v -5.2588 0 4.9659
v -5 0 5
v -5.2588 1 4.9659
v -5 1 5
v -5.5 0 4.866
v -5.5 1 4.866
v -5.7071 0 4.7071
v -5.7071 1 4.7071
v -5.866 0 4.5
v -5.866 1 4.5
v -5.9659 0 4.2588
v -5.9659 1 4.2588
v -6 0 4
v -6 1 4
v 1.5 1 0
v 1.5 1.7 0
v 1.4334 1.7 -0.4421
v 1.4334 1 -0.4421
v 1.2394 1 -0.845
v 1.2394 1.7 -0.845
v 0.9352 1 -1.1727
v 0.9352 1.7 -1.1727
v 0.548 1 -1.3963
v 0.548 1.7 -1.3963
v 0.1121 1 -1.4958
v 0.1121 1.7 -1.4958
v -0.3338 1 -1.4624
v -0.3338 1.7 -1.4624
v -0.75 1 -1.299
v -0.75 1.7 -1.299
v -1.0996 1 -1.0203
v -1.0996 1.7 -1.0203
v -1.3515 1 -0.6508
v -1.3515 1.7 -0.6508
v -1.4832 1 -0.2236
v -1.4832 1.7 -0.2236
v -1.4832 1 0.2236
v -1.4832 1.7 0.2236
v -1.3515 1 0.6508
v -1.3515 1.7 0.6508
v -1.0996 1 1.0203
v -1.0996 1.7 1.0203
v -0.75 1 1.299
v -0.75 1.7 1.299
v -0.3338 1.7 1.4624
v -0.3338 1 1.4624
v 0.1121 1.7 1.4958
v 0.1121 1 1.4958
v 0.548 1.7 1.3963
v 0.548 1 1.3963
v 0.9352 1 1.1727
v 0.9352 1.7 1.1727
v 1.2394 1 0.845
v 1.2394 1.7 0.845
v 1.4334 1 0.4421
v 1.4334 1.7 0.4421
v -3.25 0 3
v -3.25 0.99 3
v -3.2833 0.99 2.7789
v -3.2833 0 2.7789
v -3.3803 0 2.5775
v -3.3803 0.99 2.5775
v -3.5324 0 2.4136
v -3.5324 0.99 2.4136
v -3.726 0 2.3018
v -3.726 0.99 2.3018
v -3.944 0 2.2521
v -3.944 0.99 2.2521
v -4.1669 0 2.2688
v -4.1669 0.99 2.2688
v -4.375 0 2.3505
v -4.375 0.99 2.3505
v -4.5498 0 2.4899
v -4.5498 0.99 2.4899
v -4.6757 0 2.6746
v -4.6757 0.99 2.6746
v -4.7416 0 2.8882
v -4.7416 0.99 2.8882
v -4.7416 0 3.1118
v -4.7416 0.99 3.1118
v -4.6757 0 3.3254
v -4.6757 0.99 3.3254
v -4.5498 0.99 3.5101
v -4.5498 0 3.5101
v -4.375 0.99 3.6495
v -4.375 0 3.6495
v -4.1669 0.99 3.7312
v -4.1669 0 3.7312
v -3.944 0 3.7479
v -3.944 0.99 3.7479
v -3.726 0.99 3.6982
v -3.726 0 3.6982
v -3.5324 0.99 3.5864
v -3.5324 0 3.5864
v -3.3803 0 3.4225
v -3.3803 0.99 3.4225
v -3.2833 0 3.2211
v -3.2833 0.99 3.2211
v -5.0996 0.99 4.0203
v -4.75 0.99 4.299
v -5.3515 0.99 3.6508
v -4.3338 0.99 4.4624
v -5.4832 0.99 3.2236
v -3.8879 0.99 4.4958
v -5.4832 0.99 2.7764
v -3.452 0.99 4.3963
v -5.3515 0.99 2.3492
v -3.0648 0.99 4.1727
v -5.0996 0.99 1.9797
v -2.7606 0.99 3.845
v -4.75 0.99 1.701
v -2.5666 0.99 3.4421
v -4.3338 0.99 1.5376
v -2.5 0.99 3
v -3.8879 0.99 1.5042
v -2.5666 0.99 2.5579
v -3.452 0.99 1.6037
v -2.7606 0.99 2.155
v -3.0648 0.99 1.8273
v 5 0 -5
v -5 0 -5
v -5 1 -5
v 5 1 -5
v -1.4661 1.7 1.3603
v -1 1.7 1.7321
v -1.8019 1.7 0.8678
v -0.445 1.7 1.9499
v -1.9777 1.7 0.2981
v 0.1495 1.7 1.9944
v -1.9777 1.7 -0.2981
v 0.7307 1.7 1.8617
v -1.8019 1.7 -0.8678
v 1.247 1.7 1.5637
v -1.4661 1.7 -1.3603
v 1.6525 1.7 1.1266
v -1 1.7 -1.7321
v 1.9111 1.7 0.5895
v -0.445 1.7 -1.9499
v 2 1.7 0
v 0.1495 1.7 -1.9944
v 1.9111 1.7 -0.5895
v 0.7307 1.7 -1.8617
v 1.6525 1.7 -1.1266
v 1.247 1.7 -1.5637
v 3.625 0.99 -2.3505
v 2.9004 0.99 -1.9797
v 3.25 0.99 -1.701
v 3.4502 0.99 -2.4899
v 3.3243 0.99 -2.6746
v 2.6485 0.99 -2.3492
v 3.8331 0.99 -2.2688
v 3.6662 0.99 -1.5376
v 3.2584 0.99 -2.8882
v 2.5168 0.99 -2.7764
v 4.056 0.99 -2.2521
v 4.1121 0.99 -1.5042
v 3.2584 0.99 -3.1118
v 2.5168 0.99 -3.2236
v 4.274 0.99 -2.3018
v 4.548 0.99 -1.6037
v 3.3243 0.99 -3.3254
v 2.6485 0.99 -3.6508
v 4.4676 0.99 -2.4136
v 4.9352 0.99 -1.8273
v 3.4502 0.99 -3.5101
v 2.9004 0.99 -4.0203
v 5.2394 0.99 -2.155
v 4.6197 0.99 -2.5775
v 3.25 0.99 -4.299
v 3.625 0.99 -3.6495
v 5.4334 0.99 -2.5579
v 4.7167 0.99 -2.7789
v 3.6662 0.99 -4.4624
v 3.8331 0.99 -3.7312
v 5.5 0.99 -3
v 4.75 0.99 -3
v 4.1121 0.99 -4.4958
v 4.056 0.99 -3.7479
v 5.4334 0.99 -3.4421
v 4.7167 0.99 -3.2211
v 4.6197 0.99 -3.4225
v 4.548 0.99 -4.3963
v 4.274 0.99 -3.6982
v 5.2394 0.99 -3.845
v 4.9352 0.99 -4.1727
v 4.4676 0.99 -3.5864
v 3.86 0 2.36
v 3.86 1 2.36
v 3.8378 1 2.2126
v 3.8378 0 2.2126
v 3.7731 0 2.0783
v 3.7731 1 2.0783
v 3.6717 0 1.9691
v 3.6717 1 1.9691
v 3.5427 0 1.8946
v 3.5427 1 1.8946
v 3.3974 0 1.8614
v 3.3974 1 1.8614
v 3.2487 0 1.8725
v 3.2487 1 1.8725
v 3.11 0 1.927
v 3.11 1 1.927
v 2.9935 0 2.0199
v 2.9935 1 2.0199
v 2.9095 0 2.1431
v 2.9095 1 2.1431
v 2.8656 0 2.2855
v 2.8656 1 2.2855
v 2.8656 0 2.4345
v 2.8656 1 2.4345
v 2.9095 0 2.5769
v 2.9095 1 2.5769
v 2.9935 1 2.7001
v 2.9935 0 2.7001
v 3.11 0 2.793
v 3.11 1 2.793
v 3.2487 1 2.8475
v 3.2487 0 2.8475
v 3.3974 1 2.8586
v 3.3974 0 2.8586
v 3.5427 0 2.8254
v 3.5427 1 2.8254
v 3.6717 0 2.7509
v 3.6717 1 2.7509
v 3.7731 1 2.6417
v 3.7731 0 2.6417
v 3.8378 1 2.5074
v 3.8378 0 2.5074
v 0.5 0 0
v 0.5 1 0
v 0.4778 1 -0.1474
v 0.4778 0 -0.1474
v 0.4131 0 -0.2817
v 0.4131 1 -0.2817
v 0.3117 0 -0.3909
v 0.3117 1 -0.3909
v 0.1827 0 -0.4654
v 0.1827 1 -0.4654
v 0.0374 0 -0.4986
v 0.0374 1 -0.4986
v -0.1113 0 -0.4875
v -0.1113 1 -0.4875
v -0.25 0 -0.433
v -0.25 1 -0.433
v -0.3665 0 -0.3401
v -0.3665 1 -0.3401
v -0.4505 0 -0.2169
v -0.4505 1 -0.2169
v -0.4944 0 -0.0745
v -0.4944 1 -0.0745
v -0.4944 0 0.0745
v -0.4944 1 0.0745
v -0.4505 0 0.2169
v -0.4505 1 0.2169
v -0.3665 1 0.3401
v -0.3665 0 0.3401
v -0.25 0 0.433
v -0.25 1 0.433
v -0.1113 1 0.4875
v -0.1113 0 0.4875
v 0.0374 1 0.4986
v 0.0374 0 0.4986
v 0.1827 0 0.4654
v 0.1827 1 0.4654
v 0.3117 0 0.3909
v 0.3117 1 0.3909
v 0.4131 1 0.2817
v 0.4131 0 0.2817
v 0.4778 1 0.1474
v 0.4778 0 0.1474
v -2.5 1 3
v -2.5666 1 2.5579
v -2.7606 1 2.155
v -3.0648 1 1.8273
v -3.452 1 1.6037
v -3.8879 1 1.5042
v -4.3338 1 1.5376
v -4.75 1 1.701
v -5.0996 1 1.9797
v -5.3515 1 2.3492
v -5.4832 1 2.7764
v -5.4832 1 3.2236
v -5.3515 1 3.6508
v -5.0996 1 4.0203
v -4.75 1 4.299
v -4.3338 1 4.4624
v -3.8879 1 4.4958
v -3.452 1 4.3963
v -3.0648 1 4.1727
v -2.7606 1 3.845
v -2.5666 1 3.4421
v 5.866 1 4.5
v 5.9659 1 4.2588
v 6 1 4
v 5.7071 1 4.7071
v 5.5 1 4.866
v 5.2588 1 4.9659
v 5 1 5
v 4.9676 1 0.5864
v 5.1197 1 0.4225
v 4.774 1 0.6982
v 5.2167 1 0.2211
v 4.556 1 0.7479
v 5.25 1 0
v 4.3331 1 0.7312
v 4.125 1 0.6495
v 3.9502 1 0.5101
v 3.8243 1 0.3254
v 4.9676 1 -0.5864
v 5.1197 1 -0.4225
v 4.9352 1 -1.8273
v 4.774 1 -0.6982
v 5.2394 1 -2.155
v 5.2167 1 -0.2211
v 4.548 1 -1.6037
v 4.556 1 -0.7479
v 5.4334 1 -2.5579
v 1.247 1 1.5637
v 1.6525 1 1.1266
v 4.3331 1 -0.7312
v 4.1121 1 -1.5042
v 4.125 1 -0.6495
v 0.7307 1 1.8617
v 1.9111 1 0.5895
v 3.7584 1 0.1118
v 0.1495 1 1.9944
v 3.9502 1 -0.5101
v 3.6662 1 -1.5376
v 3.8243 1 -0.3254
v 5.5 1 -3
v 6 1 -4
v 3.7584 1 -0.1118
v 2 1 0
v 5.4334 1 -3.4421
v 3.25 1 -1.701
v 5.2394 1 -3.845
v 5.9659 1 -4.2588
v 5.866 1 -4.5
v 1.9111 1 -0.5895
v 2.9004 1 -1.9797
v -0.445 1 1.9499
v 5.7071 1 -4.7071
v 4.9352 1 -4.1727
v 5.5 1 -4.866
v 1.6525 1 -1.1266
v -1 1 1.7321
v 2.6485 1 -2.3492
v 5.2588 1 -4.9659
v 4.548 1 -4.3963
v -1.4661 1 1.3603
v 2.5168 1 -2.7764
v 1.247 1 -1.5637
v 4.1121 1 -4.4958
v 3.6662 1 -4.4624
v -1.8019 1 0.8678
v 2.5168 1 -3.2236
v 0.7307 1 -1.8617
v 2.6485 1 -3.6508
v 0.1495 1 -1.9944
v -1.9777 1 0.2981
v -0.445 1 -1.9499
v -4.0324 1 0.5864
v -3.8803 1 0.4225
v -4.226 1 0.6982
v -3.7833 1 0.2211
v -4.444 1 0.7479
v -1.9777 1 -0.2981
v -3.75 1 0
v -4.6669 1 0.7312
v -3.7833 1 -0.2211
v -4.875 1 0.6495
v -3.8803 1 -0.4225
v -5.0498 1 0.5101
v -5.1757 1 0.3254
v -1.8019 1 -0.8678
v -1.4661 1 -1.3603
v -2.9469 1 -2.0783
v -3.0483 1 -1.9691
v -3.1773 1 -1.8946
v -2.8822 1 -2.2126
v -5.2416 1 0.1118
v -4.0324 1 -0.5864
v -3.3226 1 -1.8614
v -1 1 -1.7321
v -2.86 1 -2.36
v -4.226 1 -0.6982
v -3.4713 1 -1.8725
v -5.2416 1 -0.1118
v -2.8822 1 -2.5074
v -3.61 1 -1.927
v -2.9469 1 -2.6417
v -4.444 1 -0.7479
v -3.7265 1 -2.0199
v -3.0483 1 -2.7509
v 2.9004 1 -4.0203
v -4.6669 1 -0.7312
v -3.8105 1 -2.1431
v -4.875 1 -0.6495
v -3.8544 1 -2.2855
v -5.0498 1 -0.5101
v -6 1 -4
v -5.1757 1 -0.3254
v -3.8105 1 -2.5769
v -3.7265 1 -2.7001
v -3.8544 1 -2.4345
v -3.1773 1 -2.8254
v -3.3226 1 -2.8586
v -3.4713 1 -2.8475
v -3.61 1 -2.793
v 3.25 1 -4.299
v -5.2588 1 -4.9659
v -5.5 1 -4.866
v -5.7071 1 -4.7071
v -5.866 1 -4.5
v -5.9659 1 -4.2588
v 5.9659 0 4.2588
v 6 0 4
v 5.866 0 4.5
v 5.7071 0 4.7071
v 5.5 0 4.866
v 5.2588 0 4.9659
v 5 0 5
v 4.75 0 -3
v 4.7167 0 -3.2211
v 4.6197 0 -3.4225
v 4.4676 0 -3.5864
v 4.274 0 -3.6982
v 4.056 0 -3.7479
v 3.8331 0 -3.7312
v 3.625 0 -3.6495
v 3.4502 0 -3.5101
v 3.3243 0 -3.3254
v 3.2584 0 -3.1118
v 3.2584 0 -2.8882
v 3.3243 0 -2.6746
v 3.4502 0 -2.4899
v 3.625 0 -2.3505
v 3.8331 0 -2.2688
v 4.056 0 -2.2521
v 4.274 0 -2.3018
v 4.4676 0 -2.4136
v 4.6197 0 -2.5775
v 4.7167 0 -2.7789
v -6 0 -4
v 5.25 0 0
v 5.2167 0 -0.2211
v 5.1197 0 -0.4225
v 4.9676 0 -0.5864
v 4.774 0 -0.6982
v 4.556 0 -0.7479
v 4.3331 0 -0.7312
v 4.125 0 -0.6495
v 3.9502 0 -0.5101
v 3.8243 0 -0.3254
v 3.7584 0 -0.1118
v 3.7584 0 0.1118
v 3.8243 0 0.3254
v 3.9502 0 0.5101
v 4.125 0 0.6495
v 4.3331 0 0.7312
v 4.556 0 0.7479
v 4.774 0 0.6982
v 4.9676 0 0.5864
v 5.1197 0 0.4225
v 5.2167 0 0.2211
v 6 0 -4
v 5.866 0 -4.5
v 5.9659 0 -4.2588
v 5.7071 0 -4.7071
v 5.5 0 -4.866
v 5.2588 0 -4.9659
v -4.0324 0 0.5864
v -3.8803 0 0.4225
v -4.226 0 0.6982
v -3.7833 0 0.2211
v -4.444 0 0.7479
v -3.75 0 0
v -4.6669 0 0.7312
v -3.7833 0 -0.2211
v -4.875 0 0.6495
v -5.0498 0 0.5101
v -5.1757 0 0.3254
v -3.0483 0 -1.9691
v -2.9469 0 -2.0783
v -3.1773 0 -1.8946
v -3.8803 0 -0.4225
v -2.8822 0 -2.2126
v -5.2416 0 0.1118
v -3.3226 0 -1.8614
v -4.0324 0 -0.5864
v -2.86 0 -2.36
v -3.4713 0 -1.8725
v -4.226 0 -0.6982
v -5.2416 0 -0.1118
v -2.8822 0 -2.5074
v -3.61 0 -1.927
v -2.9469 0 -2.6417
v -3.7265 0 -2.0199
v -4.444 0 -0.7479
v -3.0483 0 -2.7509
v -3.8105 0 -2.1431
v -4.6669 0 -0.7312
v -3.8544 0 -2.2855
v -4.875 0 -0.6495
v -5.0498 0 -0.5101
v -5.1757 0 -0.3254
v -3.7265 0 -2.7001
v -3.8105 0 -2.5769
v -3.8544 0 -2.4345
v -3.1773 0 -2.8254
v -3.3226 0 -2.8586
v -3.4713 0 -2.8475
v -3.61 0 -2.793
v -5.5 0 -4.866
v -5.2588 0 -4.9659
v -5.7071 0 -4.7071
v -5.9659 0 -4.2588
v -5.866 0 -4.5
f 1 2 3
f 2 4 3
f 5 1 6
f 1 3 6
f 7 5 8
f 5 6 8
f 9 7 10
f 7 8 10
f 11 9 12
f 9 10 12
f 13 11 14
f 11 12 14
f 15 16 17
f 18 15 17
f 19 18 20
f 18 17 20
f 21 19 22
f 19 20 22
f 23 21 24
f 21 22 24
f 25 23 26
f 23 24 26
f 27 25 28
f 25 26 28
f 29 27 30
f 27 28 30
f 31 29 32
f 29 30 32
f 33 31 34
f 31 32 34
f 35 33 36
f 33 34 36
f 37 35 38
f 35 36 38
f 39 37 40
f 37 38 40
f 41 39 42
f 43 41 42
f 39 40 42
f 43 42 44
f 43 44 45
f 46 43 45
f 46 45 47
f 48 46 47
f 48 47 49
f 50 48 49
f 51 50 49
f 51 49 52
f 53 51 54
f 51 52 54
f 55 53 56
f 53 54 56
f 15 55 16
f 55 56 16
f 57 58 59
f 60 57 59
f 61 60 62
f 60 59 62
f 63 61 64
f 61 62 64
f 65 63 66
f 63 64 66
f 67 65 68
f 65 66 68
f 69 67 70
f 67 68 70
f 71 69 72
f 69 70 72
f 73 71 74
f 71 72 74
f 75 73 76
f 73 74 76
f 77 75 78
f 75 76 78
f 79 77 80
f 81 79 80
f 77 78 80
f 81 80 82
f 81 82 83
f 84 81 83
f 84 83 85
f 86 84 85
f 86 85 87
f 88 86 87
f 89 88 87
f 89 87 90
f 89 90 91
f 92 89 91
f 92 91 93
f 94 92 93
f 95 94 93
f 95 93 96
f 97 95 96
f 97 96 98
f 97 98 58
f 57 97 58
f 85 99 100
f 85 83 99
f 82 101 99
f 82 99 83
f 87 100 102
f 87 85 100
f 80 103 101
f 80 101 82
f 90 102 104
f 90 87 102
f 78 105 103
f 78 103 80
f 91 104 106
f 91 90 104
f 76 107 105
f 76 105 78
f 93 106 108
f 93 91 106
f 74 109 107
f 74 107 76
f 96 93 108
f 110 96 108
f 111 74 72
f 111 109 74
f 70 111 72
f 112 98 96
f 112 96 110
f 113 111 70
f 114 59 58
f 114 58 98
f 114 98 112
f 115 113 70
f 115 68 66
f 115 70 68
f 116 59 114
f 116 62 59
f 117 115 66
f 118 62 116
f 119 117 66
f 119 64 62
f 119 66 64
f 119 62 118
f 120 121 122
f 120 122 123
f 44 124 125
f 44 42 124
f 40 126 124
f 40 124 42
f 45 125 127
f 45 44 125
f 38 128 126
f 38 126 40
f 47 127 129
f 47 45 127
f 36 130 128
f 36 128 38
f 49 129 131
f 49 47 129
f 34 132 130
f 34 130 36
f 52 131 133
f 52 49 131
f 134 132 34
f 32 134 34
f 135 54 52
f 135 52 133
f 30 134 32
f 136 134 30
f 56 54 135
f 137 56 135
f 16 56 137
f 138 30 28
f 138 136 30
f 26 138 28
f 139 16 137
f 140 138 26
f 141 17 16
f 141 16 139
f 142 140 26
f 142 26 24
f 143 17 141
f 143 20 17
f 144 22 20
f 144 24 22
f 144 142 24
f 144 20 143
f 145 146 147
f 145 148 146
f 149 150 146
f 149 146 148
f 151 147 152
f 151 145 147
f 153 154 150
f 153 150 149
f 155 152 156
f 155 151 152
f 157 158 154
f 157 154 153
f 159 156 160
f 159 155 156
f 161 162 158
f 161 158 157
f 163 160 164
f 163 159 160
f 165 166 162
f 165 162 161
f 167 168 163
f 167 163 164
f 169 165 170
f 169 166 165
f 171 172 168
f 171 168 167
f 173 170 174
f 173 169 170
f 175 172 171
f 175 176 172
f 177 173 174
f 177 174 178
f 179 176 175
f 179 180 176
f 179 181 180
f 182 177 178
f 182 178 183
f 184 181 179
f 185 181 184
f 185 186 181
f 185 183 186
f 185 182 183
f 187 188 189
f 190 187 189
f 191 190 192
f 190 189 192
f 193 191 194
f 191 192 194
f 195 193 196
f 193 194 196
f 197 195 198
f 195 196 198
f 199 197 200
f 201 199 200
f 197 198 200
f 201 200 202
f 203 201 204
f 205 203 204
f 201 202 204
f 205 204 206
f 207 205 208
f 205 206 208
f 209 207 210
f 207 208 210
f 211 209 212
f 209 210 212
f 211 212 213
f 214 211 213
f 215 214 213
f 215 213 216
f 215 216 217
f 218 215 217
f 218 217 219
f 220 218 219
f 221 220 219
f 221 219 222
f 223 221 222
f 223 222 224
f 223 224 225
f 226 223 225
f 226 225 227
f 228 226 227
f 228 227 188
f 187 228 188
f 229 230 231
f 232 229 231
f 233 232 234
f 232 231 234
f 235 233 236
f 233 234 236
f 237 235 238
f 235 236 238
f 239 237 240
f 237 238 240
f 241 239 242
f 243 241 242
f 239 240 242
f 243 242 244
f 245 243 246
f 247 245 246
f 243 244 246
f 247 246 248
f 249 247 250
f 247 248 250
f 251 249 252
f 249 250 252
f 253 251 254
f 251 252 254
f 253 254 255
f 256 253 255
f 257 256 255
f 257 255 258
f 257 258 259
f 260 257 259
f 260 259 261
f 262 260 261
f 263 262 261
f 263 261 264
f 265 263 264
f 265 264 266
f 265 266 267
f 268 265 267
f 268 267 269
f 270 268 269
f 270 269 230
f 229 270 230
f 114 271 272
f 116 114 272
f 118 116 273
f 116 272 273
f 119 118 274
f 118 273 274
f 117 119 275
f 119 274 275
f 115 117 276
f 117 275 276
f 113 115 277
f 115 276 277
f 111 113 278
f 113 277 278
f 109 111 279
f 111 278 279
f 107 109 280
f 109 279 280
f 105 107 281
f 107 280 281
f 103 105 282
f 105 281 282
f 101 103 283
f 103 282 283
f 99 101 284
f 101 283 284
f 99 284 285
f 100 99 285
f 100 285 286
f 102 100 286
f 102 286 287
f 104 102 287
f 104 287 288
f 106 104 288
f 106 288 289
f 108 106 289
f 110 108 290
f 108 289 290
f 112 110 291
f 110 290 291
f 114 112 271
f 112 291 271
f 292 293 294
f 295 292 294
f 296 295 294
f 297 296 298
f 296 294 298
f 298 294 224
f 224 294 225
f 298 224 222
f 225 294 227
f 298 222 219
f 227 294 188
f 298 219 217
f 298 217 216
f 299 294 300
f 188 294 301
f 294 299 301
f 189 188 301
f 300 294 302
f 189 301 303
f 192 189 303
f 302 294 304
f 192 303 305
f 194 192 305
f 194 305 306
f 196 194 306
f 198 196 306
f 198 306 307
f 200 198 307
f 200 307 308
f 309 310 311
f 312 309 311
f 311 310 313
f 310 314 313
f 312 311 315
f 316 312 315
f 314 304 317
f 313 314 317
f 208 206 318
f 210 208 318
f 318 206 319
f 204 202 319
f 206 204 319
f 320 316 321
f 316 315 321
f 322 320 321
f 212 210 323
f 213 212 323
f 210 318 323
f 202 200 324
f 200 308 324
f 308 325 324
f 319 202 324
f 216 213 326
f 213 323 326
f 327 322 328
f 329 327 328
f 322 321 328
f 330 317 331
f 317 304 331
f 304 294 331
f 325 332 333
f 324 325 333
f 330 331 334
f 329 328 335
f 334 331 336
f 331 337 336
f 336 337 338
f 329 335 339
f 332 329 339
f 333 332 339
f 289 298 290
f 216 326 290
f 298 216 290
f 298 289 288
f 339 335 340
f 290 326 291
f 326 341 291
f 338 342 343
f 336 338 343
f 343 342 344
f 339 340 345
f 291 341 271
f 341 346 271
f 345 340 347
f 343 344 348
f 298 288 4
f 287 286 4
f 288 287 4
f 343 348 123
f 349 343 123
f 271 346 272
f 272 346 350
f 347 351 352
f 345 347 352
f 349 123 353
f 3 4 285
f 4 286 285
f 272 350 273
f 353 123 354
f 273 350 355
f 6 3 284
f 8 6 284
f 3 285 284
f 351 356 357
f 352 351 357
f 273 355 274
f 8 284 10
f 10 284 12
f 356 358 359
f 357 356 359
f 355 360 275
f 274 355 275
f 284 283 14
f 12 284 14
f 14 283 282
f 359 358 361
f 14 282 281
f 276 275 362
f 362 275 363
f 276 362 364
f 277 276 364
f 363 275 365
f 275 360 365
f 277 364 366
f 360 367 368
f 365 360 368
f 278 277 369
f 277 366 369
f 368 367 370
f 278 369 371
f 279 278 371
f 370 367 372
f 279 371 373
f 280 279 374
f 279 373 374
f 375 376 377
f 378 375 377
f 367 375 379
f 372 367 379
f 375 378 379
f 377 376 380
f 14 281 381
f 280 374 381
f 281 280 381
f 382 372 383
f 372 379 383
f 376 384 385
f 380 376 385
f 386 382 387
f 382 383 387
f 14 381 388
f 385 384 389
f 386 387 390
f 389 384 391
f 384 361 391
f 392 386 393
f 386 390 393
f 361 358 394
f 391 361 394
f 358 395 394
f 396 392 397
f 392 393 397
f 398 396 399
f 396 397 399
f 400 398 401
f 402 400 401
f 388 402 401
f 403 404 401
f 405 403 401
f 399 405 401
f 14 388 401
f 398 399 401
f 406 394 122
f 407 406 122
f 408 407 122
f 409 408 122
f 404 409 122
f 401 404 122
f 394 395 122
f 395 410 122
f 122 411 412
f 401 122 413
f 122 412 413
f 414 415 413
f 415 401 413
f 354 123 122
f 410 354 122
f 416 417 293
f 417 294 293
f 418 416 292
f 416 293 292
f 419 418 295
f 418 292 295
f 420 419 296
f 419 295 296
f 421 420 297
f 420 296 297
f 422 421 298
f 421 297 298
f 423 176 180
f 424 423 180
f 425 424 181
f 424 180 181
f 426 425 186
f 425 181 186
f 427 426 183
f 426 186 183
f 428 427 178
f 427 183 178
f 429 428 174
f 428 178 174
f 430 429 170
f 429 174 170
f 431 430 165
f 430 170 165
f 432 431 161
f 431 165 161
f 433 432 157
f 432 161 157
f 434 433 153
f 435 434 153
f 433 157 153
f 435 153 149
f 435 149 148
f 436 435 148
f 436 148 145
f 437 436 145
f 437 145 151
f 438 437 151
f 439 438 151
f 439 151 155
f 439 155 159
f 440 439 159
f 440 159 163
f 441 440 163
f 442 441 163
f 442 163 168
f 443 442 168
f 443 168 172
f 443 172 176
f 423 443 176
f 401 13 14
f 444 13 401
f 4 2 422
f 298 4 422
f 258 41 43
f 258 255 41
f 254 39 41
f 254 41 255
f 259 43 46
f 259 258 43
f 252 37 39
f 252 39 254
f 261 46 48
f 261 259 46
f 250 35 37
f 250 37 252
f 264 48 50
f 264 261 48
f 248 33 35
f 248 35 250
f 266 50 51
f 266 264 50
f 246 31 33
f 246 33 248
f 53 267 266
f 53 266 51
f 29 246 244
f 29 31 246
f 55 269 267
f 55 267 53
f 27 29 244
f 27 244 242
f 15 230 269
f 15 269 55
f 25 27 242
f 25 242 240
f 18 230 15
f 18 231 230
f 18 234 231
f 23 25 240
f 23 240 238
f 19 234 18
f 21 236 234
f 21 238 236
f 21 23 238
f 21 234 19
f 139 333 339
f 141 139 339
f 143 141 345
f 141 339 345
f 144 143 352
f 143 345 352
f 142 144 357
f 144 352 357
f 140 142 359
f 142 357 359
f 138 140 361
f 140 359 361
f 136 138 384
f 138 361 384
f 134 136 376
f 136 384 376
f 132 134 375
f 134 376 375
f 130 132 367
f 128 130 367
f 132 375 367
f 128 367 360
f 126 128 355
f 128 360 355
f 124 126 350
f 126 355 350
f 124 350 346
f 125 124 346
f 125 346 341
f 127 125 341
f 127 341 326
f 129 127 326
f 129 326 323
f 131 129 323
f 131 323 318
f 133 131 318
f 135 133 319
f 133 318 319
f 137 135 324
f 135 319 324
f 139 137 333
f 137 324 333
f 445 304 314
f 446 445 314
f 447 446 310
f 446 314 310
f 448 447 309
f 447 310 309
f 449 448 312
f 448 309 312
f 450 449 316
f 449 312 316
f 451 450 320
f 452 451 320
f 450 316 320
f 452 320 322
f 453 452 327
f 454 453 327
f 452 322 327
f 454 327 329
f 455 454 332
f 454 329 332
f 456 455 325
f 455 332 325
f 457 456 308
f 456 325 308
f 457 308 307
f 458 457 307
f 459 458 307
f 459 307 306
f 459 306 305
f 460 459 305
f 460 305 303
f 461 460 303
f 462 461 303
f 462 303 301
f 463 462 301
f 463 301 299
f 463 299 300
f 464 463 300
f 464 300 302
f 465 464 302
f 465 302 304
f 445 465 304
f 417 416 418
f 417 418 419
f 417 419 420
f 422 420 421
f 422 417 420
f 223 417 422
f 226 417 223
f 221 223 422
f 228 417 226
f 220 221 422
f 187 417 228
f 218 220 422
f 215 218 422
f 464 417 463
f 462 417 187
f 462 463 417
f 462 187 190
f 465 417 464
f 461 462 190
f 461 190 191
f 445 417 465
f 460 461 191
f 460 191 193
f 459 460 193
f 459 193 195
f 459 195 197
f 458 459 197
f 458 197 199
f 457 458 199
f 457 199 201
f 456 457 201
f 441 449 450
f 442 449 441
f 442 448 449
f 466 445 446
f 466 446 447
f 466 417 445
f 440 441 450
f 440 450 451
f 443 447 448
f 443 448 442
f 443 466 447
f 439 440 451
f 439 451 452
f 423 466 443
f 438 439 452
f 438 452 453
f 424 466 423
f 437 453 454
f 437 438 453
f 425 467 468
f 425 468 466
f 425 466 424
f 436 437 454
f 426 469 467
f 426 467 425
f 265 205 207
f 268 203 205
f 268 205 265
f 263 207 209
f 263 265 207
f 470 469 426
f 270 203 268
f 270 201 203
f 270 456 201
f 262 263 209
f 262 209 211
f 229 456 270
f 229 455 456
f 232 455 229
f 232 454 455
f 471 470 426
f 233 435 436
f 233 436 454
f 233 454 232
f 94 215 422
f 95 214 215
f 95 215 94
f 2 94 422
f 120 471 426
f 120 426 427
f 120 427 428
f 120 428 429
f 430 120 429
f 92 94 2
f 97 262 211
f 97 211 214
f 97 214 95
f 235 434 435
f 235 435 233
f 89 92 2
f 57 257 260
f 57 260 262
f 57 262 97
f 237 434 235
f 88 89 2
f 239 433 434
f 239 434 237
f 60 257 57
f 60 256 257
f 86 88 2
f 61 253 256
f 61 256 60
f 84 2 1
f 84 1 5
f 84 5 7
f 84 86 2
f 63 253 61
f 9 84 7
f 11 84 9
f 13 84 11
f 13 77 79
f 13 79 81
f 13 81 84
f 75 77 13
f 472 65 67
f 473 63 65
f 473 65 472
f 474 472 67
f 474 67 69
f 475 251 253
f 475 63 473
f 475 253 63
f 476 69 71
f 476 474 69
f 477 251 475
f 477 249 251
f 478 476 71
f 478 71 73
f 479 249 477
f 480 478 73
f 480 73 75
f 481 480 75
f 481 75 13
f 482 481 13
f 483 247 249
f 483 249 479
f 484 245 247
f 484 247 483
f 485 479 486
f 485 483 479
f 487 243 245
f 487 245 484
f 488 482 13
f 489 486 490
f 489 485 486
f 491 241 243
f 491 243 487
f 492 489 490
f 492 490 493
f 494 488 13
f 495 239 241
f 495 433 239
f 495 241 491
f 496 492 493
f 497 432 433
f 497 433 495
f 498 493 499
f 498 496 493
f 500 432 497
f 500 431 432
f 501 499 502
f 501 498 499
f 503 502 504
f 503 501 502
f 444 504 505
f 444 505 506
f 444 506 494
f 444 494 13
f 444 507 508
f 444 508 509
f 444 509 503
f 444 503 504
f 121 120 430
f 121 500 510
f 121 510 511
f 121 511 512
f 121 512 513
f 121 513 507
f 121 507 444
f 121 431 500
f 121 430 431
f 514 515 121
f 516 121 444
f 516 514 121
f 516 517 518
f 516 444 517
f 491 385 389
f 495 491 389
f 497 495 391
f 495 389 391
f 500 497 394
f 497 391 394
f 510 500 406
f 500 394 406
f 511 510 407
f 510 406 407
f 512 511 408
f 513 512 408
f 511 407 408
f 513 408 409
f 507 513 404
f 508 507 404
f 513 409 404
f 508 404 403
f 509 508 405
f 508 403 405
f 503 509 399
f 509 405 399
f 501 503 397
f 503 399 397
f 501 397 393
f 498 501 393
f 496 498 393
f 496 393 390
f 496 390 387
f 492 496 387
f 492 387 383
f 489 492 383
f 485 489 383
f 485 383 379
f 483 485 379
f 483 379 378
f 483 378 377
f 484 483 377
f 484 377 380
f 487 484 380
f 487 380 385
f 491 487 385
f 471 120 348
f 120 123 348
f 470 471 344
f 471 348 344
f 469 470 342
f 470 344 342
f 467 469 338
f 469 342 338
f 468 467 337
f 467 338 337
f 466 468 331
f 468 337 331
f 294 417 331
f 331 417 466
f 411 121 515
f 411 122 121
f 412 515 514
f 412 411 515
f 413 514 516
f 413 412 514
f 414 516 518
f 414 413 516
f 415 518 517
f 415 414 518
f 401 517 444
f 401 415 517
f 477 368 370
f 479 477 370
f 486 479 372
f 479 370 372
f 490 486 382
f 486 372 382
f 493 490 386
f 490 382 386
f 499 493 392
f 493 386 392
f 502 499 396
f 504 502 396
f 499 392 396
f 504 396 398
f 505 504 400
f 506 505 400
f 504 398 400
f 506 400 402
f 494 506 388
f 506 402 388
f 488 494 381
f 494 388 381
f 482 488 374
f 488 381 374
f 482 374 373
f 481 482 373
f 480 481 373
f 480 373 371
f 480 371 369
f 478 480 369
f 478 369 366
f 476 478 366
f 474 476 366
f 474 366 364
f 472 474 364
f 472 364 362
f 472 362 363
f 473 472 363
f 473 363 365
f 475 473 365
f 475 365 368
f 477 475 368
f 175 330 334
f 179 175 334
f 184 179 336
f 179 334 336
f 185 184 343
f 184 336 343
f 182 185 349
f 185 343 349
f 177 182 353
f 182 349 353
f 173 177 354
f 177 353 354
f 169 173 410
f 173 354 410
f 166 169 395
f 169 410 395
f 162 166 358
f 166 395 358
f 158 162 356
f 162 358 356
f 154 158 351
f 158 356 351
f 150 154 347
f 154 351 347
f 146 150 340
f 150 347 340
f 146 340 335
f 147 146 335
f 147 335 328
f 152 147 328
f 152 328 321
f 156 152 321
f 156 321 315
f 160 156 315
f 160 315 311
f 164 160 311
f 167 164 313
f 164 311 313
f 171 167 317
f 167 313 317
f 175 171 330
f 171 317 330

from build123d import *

# Parameters (mm, degrees)
SALIENTE_EXTRUIR1_DEPTH = 1
REDONDEO1_R             = 1
CROQUIS2_R              = 1.5
CORTAR_EXTRUIR3_DEPTH   = 0.01
CROQUIS5_R              = 0.75
CORTAR_EXTRUIR5_DEPTH   = 1.1
CROQUIS6_R              = 0.75
CROQUIS6_R_2            = 0.5
CORTAR_EXTRUIR6_DEPTH   = 1.1
CROQUIS7_R              = 2
SALIENTE_EXTRUIR2_DEPTH = 0.7
CROQUIS8_R              = 1.5
CORTAR_EXTRUIR7_DEPTH   = 0.7
CROQUIS9_R              = 0.5
CORTAR_EXTRUIR9_DEPTH   = 8


with BuildPart() as part:
    # Croquis1 → Saliente-Extruir1 (new body)
    with BuildSketch(Plane(origin=(0, 0, 0), x_dir=(1, 0, 0), z_dir=(0, 1, 0))):
        Polygon((-6, 5), (6, 5), (6, 0.5), (6, -5), (1.5, -5), (-6, -5), align=None)
    extrude(amount=SALIENTE_EXTRUIR1_DEPTH)

    # Redondeo1
    redondeo1_edges = [part.edges().sort_by_distance(p)[0] for p in [
        (-6, 0.5, -5),
        (6, 0.5, -5),
        (6, 0.5, 5),
        (-6, 0.5, 5),
    ]]
    fillet(redondeo1_edges, radius=REDONDEO1_R)

    # Croquis2 → Cortar-Extruir3 (cut)
    with BuildSketch(Plane(origin=(0, 1, 0), x_dir=(1, 0, 0), z_dir=(0, 1, 0))):
        with Locations((4, 3)):
            Circle(CROQUIS2_R)
        with Locations((-4, -3)):
            Circle(CROQUIS2_R)
    extrude(amount=-CORTAR_EXTRUIR3_DEPTH, mode=Mode.SUBTRACT)

    # Croquis5 → Cortar-Extruir5 (cut)
    with BuildSketch(Plane(origin=(0, 0.99, 0), x_dir=(1, 0, 0), z_dir=(0, 1, 0))):
        with Locations((4, 3)):
            Circle(CROQUIS5_R)
        with Locations((-4, -3)):
            Circle(CROQUIS5_R)
    extrude(amount=-CORTAR_EXTRUIR5_DEPTH, mode=Mode.SUBTRACT)

    # Croquis6 → Cortar-Extruir6 (cut)
    with BuildSketch(Plane(origin=(0, 1, 0), x_dir=(1, 0, 0), z_dir=(0, 1, 0))):
        with Locations((4.5, 0)):
            Circle(CROQUIS6_R)
        with Locations((-4.5, 0)):
            Circle(CROQUIS6_R)
        with Locations((3.36, -2.36)):
            Circle(CROQUIS6_R_2)
        with Locations((-3.36, 2.36)):
            Circle(CROQUIS6_R_2)
    extrude(amount=-CORTAR_EXTRUIR6_DEPTH, mode=Mode.SUBTRACT)

    # Croquis7 → Saliente-Extruir2 (add)
    with BuildSketch(Plane(origin=(0, 1, 0), x_dir=(1, 0, 0), z_dir=(0, 1, 0))):
        Circle(CROQUIS7_R)
    extrude(amount=SALIENTE_EXTRUIR2_DEPTH)

    # Croquis8 → Cortar-Extruir7 (cut)
    with BuildSketch(Plane(origin=(0, 1.7, 0), x_dir=(1, 0, 0), z_dir=(0, 1, 0))):
        Circle(CROQUIS8_R)
    extrude(amount=-CORTAR_EXTRUIR7_DEPTH, mode=Mode.SUBTRACT)

    # Croquis9 → Cortar-Extruir9 (cut)
    with BuildSketch(Plane(origin=(0, 1, 0), x_dir=(1, 0, 0), z_dir=(0, 1, 0))):
        Circle(CROQUIS9_R)
    extrude(amount=-CORTAR_EXTRUIR9_DEPTH, mode=Mode.SUBTRACT)


solid = part.part
